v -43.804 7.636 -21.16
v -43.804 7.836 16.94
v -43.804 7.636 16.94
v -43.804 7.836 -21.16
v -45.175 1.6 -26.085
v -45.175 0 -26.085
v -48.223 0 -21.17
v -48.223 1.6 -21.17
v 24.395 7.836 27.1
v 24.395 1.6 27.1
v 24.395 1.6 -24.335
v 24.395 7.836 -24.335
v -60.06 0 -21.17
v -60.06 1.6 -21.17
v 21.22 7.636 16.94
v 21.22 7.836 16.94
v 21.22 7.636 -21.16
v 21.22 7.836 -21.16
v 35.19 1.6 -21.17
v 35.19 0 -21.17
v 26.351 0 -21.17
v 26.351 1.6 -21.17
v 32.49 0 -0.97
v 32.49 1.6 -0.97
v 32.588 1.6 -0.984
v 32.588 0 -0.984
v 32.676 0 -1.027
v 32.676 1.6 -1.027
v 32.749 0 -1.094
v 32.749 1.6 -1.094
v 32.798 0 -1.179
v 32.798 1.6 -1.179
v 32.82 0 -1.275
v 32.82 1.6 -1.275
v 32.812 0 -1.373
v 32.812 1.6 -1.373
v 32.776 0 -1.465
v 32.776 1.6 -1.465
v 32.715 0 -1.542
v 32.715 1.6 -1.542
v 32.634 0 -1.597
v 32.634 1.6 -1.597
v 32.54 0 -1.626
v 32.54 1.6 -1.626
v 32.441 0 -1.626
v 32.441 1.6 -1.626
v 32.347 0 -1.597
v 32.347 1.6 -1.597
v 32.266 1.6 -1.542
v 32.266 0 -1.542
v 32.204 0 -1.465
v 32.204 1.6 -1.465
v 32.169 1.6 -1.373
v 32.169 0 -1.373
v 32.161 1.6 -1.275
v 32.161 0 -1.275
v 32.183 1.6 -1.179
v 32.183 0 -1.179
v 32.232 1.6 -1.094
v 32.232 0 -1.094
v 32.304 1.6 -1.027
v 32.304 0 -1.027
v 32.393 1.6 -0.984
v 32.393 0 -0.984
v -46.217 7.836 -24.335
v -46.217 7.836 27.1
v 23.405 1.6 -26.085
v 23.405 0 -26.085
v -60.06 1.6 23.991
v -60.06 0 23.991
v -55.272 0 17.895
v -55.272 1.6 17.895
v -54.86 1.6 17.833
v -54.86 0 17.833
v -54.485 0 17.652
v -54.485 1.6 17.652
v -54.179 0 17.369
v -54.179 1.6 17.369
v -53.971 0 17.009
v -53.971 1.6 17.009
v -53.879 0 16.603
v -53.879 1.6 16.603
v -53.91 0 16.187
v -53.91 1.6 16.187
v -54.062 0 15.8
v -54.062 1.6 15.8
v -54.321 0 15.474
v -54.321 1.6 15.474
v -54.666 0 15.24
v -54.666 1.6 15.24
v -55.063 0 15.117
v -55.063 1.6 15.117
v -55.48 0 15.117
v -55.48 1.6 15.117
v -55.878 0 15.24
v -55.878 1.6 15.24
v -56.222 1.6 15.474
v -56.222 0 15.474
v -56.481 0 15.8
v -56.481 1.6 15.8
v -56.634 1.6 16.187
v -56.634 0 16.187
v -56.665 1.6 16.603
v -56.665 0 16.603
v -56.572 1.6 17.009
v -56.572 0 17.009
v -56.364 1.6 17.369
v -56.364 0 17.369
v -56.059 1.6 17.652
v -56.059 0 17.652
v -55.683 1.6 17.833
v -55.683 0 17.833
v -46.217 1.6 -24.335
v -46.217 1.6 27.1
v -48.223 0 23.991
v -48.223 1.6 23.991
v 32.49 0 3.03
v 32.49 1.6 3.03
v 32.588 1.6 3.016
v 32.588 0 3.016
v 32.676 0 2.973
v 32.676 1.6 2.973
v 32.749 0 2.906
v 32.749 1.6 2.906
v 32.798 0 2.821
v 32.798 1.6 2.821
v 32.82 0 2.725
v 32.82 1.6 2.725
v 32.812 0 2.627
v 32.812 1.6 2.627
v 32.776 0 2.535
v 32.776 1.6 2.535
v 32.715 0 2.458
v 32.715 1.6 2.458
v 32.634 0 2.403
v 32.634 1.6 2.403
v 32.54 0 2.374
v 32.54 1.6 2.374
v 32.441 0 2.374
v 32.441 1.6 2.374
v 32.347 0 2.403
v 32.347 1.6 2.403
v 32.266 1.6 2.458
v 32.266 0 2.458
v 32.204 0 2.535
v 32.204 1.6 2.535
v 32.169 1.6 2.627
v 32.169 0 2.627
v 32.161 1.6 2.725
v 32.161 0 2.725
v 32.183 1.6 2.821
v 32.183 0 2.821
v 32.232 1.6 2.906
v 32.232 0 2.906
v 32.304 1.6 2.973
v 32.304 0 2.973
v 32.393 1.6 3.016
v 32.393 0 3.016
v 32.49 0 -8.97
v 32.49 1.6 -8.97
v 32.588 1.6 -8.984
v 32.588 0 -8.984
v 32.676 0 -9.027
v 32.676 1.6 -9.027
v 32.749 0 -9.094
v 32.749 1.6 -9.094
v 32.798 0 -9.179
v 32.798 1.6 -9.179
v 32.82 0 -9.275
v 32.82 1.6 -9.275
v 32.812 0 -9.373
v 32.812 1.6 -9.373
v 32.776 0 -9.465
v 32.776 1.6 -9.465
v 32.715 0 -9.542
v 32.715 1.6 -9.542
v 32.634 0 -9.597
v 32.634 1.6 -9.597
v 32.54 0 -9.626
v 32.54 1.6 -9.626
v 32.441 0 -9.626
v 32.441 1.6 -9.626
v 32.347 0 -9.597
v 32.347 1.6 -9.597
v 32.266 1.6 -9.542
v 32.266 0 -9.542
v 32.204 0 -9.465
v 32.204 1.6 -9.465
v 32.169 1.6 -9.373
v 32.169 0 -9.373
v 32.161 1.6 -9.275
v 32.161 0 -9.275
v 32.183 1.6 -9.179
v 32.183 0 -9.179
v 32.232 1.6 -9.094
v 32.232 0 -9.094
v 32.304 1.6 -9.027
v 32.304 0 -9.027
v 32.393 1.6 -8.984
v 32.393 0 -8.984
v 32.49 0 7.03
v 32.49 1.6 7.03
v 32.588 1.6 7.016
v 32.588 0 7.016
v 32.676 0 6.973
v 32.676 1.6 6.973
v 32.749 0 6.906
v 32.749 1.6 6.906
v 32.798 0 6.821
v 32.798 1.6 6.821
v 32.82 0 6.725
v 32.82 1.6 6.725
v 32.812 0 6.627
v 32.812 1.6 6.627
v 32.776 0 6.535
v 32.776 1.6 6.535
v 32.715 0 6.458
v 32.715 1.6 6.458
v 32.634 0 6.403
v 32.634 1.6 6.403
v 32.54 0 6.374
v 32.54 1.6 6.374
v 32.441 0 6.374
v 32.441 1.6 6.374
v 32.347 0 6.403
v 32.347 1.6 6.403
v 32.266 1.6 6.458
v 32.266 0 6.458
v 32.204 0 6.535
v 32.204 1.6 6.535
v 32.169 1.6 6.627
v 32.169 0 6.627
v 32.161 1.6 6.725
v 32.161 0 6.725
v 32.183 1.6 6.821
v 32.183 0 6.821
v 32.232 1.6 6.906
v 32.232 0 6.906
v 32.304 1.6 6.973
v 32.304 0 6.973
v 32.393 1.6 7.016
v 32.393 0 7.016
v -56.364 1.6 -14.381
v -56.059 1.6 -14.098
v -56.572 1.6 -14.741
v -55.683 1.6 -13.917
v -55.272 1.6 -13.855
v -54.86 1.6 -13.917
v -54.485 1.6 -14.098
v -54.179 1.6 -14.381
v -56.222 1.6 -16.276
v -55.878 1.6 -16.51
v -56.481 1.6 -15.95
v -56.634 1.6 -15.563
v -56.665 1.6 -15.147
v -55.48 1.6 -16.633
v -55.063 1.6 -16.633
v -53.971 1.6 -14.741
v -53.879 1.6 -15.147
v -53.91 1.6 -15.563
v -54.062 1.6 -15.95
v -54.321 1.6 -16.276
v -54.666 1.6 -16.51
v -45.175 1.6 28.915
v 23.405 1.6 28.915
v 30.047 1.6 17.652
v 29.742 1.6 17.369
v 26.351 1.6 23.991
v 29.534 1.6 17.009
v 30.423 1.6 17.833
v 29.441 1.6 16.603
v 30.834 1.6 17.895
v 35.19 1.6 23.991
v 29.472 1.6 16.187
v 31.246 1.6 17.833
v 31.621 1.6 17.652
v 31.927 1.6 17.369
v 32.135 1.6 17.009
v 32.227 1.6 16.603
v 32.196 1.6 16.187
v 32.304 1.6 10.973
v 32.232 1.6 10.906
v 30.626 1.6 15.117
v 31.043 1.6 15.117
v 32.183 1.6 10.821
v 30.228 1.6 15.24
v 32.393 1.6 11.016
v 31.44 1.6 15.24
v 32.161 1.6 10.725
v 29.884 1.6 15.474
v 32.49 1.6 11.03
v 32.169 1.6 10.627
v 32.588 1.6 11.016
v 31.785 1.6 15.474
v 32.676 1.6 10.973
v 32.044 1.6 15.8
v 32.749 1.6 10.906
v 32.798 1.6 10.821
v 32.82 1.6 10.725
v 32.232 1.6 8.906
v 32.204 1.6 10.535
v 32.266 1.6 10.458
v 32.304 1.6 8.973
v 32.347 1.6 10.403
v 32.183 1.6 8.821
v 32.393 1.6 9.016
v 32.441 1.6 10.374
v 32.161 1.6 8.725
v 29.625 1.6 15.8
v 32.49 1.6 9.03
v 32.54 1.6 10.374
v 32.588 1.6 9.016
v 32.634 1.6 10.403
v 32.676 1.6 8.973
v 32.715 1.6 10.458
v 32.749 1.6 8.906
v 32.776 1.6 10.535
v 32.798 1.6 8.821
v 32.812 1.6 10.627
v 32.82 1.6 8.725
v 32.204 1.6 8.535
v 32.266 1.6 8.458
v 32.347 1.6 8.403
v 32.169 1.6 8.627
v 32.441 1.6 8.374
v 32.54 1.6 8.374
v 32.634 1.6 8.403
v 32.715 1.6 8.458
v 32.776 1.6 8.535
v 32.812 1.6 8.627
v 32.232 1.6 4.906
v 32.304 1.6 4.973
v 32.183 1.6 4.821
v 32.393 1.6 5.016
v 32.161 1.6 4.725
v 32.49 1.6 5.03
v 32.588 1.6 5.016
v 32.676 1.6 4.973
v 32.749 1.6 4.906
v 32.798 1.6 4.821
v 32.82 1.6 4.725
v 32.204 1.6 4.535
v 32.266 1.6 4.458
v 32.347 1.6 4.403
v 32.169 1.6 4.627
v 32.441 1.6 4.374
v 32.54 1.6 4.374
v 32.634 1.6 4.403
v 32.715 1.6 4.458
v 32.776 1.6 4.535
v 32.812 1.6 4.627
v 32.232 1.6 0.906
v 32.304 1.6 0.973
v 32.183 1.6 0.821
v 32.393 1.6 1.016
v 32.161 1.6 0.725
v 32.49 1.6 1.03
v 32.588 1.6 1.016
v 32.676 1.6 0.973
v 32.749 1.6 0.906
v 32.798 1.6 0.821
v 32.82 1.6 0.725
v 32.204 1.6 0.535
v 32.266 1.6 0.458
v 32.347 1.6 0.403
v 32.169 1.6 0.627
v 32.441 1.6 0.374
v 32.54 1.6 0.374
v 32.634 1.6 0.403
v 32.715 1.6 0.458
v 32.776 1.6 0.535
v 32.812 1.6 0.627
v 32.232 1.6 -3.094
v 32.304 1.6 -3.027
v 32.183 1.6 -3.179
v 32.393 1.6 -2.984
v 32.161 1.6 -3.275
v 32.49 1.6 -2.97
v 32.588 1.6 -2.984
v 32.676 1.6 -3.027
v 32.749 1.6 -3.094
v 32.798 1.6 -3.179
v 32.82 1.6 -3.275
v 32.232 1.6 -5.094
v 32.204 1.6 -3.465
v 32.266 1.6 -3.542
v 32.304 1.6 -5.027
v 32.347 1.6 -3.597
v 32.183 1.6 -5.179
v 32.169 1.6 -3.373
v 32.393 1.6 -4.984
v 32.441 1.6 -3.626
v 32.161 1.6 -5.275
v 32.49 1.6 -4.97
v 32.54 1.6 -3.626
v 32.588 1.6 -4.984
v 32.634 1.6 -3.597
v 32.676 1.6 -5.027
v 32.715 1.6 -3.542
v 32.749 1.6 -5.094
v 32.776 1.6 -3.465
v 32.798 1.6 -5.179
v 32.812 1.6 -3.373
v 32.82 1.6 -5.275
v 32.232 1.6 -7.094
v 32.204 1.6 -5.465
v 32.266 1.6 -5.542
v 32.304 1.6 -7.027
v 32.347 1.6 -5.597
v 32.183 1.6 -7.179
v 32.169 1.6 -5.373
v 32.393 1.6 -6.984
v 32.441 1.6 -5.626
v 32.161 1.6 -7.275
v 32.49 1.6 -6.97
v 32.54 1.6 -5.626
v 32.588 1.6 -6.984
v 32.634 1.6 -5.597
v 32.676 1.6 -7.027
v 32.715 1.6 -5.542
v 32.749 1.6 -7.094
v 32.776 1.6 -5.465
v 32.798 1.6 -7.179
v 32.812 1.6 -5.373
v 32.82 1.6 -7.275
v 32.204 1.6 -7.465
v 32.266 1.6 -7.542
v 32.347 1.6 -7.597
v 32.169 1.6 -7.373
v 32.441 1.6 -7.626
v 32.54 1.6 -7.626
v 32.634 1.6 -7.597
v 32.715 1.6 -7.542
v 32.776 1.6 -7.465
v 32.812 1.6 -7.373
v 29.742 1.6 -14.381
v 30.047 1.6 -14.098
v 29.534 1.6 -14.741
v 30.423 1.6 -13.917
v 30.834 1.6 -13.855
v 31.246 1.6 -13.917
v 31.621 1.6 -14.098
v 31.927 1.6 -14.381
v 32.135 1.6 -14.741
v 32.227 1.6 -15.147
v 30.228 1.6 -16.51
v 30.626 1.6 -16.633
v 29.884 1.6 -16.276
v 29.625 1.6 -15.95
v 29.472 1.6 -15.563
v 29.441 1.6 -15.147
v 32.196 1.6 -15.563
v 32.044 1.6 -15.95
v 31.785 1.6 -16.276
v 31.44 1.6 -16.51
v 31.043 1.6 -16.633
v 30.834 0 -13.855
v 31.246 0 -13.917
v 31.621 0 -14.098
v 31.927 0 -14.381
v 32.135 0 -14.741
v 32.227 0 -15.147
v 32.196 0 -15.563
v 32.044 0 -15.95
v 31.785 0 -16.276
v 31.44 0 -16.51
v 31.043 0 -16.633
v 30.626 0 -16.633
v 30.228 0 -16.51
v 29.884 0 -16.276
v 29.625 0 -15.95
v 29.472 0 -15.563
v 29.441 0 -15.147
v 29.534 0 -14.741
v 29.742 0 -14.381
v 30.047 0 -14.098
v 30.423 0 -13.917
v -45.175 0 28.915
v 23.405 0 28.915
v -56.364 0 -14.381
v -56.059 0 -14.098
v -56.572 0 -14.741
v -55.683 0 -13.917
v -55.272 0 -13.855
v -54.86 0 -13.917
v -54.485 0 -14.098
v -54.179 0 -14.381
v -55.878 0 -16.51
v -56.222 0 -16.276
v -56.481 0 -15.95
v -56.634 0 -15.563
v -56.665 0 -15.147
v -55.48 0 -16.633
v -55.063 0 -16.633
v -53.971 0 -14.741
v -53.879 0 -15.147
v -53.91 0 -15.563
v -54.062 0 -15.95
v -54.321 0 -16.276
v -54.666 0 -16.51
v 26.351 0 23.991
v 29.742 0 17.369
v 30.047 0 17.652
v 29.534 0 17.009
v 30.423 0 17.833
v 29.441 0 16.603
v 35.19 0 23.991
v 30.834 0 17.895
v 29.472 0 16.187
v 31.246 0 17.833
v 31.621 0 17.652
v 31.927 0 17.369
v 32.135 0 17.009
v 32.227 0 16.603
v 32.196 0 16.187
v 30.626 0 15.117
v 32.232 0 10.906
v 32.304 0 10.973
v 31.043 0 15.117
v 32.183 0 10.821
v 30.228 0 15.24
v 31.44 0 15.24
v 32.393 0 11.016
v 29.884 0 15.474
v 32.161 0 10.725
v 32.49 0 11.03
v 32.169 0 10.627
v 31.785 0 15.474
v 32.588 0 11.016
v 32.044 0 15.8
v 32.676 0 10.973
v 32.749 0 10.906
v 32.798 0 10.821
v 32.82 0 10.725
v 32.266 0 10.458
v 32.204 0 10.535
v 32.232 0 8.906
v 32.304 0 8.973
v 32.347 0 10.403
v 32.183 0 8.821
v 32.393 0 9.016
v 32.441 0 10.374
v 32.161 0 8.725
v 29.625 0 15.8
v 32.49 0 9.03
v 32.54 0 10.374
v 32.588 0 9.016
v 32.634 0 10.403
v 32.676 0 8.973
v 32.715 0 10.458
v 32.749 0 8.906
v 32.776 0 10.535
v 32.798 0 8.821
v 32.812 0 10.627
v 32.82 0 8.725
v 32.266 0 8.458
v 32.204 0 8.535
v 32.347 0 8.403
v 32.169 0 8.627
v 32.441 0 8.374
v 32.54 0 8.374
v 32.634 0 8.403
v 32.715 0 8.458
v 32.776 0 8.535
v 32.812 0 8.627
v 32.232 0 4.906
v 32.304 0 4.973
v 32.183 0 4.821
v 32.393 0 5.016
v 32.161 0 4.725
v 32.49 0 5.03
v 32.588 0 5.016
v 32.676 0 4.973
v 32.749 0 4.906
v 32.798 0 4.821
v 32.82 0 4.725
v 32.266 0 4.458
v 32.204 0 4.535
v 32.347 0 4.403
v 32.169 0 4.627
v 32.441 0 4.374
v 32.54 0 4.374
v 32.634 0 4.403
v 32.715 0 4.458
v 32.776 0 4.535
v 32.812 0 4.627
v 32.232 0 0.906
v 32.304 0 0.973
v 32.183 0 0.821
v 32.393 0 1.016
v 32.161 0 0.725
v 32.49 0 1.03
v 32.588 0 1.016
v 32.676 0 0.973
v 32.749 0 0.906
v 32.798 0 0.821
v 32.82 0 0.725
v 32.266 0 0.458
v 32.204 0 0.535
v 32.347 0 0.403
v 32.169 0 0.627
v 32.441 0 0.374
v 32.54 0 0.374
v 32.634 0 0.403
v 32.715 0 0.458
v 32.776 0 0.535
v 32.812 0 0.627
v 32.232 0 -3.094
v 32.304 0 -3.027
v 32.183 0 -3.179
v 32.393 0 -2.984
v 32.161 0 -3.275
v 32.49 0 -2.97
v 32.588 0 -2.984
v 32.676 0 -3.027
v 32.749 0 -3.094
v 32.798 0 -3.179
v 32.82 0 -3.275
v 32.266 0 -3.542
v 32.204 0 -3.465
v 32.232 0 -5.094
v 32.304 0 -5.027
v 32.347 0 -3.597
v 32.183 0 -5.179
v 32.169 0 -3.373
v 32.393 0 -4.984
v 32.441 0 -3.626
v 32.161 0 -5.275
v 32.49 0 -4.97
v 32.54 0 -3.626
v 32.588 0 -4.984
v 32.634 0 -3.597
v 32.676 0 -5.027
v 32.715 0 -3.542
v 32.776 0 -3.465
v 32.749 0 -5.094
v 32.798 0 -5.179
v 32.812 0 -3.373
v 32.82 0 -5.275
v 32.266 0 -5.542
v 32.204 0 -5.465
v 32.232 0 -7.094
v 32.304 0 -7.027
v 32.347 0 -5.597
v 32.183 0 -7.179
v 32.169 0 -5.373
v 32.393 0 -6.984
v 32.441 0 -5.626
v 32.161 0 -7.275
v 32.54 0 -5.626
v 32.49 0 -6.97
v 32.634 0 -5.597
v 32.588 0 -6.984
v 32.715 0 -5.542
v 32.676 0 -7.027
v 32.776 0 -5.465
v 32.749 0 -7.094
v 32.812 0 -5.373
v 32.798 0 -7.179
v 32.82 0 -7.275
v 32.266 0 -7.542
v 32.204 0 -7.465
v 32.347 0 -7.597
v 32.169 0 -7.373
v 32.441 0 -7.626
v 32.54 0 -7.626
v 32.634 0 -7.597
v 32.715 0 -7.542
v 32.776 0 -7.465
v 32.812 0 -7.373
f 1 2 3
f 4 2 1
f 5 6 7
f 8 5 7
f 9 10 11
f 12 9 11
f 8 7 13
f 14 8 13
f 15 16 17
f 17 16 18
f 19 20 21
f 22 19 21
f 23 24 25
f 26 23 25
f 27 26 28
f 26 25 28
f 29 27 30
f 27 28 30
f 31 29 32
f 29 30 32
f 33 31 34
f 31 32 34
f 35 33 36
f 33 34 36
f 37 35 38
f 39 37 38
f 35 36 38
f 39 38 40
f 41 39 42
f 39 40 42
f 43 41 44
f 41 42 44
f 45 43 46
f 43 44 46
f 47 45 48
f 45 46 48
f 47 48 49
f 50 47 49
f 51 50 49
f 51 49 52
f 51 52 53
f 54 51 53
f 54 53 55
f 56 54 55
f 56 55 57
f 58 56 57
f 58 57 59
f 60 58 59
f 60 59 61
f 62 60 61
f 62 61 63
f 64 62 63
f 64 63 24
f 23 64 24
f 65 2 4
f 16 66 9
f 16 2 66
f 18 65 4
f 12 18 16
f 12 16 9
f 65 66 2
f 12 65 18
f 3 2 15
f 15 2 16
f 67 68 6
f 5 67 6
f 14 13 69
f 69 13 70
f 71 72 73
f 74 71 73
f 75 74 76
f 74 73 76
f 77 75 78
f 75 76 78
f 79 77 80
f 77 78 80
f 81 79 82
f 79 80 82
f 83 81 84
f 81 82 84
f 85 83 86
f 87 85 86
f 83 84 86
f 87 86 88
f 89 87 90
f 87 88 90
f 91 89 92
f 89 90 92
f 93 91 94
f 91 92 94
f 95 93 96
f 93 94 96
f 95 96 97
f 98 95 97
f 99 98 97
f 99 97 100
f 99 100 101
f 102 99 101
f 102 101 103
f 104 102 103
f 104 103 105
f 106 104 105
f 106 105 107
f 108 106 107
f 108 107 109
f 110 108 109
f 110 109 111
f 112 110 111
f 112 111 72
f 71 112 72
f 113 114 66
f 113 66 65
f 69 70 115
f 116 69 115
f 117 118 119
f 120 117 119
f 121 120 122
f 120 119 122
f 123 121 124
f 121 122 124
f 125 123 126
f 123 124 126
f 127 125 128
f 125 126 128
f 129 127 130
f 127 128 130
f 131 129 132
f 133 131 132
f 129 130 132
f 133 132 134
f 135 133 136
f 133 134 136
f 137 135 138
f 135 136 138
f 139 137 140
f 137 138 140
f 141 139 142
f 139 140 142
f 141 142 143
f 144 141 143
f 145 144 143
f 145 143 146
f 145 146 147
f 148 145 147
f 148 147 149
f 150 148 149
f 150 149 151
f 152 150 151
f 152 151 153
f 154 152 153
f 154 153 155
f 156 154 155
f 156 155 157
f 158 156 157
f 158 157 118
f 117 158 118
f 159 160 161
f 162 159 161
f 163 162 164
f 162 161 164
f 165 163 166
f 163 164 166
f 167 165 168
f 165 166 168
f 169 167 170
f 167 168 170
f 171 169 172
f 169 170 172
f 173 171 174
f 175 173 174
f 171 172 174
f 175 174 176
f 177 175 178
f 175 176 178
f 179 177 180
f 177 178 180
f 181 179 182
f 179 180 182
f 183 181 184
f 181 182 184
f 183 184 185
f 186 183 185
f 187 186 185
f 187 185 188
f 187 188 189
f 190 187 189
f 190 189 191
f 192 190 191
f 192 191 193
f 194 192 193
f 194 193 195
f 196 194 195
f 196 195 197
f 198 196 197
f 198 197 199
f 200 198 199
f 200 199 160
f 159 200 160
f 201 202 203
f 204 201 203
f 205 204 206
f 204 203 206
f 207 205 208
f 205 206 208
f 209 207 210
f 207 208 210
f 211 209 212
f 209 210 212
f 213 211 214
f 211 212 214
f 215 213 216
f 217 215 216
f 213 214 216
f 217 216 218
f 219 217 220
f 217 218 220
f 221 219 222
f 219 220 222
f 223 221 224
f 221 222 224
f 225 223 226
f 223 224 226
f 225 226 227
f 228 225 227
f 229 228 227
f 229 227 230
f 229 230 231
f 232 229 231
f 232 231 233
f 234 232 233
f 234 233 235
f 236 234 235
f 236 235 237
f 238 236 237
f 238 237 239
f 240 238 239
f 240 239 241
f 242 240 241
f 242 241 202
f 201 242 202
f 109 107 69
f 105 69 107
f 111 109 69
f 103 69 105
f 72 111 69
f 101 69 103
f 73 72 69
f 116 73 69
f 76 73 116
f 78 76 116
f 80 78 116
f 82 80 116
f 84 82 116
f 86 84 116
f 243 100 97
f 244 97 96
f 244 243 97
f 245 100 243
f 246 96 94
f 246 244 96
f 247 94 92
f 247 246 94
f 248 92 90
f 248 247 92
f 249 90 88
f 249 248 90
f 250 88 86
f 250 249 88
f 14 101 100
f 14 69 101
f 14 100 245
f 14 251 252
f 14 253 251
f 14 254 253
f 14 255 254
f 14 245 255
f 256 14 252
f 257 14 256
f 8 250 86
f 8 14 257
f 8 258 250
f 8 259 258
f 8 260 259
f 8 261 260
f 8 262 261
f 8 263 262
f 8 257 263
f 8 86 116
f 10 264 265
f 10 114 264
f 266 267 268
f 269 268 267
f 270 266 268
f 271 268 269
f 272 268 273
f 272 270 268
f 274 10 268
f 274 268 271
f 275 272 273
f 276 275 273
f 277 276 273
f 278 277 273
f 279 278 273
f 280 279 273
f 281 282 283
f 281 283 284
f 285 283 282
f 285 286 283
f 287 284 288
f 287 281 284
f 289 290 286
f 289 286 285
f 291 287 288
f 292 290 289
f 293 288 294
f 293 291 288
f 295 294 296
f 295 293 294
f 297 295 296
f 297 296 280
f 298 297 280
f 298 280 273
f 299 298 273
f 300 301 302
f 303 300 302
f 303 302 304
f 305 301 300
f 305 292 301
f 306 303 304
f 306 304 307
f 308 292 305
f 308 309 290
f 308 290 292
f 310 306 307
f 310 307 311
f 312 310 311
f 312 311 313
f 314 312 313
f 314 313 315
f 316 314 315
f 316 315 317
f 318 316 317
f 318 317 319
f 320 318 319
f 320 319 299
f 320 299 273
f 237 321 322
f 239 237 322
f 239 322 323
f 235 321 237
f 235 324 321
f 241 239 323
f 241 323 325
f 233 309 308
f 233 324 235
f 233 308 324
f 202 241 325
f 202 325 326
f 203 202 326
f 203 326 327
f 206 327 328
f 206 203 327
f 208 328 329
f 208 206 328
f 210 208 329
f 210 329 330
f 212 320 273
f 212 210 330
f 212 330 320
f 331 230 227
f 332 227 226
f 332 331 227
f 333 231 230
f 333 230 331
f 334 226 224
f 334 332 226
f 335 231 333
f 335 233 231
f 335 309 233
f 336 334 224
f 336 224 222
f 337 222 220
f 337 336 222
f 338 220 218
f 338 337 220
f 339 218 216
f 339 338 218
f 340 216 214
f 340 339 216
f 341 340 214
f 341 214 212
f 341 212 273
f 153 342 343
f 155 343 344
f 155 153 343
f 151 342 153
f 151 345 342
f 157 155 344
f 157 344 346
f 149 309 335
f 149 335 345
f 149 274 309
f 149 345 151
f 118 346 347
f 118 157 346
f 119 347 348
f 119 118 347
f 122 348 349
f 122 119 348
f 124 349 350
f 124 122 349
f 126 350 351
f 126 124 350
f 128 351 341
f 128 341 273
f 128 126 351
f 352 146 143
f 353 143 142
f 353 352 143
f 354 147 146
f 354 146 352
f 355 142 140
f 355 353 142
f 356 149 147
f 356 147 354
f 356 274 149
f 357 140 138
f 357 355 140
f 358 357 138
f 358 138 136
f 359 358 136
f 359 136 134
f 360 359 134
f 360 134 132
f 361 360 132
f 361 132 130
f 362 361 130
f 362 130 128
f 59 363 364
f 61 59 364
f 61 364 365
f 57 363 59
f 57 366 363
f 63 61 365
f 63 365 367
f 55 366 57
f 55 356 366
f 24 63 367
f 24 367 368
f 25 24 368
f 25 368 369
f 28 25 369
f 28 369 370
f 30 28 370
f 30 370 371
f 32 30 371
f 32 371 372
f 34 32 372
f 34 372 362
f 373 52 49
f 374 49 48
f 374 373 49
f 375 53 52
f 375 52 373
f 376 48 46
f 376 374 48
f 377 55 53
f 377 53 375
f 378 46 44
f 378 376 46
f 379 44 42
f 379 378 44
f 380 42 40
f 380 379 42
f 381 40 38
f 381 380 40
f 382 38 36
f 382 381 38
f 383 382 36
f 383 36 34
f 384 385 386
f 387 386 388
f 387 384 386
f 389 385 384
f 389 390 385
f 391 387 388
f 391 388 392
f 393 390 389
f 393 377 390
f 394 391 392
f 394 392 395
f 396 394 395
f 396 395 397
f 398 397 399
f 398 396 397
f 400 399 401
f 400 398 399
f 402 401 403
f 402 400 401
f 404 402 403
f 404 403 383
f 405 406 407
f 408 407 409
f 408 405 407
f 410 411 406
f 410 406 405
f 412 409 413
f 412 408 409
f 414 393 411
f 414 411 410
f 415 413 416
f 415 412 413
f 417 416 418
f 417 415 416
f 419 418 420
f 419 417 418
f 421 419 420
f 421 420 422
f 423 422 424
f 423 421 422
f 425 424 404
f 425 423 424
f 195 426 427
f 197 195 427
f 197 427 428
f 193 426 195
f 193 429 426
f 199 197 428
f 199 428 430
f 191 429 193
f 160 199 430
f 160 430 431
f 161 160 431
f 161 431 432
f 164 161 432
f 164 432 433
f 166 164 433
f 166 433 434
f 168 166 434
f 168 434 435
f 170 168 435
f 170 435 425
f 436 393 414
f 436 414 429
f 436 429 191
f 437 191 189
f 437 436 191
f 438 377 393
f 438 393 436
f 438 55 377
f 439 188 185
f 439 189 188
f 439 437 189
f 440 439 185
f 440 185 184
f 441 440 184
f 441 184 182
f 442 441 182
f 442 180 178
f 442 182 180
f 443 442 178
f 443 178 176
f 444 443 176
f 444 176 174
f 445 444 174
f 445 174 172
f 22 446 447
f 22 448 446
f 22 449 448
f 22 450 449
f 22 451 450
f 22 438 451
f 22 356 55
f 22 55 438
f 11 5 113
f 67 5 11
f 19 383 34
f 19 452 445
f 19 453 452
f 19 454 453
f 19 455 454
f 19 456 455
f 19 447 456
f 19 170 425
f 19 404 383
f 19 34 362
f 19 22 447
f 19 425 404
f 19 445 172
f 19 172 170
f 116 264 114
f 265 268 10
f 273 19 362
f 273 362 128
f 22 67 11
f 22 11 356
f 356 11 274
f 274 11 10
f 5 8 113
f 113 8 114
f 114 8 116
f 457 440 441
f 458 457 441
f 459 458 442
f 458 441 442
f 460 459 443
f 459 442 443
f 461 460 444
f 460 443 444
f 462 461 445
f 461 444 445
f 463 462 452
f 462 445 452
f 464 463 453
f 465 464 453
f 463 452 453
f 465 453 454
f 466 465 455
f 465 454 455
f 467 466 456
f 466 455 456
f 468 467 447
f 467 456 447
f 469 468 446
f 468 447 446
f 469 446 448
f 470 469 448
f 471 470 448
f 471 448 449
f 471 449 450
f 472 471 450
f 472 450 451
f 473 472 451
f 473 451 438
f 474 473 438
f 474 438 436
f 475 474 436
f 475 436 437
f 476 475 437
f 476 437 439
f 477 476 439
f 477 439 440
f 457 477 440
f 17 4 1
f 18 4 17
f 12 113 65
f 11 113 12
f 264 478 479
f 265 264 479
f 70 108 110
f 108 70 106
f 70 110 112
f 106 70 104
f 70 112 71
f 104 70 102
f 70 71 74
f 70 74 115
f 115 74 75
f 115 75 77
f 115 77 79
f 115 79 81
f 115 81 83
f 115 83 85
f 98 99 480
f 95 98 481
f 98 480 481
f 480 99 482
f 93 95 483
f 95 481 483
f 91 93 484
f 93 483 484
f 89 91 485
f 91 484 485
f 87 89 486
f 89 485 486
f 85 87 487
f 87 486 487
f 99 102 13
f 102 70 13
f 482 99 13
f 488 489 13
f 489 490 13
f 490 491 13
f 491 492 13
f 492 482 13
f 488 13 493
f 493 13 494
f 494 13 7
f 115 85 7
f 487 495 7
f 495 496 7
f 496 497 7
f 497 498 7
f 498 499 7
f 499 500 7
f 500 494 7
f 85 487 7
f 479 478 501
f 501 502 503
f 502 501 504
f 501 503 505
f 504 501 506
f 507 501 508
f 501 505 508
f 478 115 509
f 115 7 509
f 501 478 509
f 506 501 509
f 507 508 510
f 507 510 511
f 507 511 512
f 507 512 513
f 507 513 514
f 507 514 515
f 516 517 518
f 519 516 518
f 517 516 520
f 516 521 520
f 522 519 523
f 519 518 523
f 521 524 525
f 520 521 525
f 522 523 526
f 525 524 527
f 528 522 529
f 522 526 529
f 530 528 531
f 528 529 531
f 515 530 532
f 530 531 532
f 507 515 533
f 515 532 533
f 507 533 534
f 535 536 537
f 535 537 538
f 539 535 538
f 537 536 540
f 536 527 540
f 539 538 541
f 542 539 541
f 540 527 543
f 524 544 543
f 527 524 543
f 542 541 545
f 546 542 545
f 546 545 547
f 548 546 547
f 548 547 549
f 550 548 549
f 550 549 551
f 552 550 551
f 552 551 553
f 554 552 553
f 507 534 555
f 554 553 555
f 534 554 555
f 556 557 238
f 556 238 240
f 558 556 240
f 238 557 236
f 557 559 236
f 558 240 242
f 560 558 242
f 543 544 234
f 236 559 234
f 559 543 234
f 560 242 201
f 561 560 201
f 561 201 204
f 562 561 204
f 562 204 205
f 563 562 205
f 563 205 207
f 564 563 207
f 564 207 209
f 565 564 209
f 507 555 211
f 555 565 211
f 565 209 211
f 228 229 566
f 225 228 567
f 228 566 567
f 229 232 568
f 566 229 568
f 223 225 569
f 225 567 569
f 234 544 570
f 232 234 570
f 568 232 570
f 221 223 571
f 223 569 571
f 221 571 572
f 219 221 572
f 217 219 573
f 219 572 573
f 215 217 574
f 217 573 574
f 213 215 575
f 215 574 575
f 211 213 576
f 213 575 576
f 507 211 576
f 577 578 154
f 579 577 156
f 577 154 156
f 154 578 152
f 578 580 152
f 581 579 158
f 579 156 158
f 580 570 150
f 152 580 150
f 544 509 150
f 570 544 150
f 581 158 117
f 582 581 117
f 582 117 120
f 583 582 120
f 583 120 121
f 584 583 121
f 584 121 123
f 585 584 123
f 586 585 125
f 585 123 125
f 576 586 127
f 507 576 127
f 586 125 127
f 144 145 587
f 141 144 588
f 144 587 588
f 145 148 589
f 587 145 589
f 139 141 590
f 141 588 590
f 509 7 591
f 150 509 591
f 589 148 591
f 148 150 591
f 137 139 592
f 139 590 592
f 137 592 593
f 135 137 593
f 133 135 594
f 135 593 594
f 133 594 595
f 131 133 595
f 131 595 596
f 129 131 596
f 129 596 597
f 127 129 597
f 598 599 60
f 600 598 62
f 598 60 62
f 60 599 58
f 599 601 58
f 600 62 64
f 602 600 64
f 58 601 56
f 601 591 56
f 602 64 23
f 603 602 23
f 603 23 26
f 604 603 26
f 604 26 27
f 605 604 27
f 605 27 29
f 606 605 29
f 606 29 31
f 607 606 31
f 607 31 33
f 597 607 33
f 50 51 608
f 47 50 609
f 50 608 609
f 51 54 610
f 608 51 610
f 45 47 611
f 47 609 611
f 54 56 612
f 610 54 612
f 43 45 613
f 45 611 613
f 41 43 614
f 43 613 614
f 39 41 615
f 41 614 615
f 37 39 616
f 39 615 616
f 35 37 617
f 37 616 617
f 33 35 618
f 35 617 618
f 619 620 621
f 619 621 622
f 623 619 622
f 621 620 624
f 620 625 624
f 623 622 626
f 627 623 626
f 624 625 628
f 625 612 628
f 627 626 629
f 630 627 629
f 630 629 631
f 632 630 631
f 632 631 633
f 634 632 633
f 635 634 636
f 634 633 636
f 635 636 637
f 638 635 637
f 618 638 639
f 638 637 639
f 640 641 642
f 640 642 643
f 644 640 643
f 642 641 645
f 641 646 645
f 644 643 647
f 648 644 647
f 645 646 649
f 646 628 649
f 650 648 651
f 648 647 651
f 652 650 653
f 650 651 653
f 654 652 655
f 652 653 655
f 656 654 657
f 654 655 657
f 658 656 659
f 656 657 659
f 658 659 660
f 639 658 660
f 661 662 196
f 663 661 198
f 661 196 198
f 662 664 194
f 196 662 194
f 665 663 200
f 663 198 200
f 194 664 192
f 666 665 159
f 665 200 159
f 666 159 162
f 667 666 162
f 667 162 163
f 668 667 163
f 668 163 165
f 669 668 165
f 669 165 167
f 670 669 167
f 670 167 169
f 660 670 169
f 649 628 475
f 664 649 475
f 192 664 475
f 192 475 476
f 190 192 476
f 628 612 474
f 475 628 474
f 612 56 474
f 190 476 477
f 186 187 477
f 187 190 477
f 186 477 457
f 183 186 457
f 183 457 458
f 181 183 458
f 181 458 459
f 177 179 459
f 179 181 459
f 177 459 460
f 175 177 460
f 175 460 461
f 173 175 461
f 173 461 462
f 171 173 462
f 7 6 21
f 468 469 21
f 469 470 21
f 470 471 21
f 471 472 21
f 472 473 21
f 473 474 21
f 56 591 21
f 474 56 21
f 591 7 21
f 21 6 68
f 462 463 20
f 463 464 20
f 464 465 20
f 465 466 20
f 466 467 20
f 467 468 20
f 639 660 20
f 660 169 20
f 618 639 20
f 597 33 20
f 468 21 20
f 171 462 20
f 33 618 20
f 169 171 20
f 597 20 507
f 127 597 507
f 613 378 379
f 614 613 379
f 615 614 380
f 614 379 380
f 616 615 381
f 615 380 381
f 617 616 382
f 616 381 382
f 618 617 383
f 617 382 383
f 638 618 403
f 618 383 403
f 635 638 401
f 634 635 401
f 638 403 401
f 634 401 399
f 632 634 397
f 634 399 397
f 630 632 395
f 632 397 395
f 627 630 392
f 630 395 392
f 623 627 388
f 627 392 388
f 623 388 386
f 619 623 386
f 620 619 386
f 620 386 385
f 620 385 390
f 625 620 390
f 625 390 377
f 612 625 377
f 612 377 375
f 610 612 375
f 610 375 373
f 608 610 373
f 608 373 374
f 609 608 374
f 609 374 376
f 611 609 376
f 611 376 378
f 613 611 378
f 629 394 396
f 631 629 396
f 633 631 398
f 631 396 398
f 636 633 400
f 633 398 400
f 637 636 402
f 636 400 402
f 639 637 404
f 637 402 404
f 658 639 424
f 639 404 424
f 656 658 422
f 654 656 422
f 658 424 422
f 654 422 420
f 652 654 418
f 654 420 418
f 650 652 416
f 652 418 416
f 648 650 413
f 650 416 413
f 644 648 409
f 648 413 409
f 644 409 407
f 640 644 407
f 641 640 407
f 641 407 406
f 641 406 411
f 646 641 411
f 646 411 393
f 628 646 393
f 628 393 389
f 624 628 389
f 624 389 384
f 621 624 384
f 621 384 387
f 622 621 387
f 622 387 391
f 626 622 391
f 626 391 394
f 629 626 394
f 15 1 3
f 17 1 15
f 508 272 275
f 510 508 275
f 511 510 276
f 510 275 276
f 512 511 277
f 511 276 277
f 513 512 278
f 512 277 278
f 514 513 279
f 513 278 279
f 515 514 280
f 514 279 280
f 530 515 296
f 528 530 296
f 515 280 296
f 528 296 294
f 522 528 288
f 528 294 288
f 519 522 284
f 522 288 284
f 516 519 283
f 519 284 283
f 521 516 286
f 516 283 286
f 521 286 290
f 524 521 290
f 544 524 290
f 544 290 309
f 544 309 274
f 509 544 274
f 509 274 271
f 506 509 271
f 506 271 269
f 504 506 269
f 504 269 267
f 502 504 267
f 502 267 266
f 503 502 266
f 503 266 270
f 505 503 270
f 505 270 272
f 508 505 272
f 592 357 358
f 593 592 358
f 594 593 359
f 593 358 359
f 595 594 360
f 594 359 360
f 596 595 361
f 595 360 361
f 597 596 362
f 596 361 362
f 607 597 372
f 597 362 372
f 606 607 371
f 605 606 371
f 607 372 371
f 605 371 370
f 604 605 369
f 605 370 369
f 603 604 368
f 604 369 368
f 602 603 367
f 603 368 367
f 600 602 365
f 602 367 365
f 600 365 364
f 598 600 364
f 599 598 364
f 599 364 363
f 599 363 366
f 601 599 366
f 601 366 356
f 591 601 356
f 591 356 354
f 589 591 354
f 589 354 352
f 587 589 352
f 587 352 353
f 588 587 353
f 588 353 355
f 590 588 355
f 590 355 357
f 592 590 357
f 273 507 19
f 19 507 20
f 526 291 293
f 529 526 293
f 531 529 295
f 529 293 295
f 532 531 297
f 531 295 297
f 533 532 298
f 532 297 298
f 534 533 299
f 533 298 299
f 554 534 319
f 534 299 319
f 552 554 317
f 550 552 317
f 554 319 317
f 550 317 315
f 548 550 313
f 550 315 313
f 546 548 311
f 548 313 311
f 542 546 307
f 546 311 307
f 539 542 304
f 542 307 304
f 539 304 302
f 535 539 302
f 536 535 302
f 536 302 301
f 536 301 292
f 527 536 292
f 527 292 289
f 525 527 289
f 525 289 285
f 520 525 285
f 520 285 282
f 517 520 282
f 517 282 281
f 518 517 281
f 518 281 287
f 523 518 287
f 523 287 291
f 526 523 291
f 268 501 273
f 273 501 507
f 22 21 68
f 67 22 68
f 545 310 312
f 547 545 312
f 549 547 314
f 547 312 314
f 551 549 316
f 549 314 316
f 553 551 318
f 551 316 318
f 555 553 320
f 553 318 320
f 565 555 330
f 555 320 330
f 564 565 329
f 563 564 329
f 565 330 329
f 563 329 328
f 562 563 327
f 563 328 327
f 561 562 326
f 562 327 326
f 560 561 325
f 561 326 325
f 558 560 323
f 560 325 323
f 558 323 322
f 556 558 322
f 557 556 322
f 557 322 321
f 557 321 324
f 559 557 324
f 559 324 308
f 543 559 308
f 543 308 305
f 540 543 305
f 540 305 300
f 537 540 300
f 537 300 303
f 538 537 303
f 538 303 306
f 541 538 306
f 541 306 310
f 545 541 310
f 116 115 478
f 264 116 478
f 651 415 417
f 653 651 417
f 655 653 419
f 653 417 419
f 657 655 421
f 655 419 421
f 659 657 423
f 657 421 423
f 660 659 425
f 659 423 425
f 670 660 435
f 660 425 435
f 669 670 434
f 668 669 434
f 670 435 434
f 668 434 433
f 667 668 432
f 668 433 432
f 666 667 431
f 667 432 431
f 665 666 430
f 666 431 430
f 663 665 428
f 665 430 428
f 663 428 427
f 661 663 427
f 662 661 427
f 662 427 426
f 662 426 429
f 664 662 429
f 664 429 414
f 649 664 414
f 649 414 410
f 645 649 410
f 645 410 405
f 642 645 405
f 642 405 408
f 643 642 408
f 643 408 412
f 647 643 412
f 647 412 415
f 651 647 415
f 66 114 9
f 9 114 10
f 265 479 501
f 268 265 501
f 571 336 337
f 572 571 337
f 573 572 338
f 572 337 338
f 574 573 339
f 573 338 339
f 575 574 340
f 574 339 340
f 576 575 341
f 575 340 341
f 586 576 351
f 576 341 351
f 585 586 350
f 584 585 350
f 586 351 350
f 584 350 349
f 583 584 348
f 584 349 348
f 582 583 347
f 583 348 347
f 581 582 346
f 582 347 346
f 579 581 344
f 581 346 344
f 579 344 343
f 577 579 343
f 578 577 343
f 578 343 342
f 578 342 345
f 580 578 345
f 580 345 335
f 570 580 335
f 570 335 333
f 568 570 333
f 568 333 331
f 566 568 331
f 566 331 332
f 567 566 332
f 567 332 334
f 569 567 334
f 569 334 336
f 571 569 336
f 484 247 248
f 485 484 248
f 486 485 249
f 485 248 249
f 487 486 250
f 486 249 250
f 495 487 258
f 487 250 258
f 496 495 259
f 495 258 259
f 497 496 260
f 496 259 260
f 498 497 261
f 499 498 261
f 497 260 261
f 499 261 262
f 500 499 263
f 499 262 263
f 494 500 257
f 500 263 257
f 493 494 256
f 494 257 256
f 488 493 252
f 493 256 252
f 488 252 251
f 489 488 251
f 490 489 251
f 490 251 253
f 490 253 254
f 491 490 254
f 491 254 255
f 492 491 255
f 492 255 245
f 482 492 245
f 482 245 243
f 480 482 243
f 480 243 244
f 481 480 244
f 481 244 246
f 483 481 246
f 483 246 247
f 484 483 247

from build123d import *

# Parameters (mm, degrees)
BOSS_EXTRUDE1_DEPTH = 1.6
SKETCH2_R           = 1.397
CUT_EXTRUDE1_DEPTH  = 67.676798076
SKETCH3_W           = 70.612
SKETCH3_H           = 51.435
BOSS_EXTRUDE2_DEPTH = 6.2357
SKETCH4_W           = 65.024
SKETCH4_H           = 38.1
CUT_EXTRUDE2_DEPTH  = 0.2
SKETCH5_R           = 0.3302
CUT_EXTRUDE3_DEPTH  = 67.94863222
LPATTERN1_COUNT     = 11
LPATTERN1_PITCH     = 2


with BuildPart() as part:
    # Sketch1 → Boss-Extrude1 (new body)
    with BuildSketch(Plane(origin=(0, 0, 0), x_dir=(1, 0, 0), z_dir=(0, 1, 0))):
        Polygon((-60.059561589, 21.169974834), (-60.059561589, -23.991225166), (-48.223161589, -23.991225166), (-45.175161589, -28.915125166), (23.404838411, -28.915125166), (26.351238411, -23.991225166), (35.190438411, -23.991225166), (35.190438411, 21.169974834), (26.351238411, 21.169974834), (23.404838411, 26.084874834), (-45.175161589, 26.084874834), (-48.223161589, 21.169974834), align=None)
    extrude(amount=BOSS_EXTRUDE1_DEPTH)

    # Sketch2 → Cut-Extrude1 (cut, through all)
    with BuildSketch(Plane(origin=(0, 1.6, 0), x_dir=(1, 0, 0), z_dir=(0, 1, 0))):
        with Locations(Location((-55.271661589, 15.251774834, 0), (0, 0, 270))):
            Circle(SKETCH2_R)
        with Locations(Location((-55.271661589, -16.498225166, 0), (0, 0, 270))):
            Circle(SKETCH2_R)
        with Locations(Location((30.834338411, -16.498225166, 0), (0, 0, 270))):
            Circle(SKETCH2_R)
        with Locations(Location((30.834338411, 15.251774834, 0), (0, 0, 270))):
            Circle(SKETCH2_R)
    extrude(amount=-CUT_EXTRUDE1_DEPTH, mode=Mode.SUBTRACT)

    # Sketch3 → Boss-Extrude2 (add)
    with BuildSketch(Plane(origin=(0, 1.6, 0), x_dir=(1, 0, 0), z_dir=(0, 1, 0))):
        with Locations((-10.910561589, -1.382625166)):
            Rectangle(SKETCH3_W, SKETCH3_H)
    extrude(amount=BOSS_EXTRUDE2_DEPTH)

    # Sketch4 → Cut-Extrude2 (cut)
    with BuildSketch(Plane(origin=(0, 7.8357, 0), x_dir=(1, 0, 0), z_dir=(0, 1, 0))):
        with Locations((-11.291561589, 2.109874834)):
            Rectangle(SKETCH4_W, SKETCH4_H)
    extrude(amount=-CUT_EXTRUDE2_DEPTH, mode=Mode.SUBTRACT)

    # Sketch5 → Cut-Extrude3 (cut, through all)
    with BuildSketch(Plane(origin=(0, 1.6, 0), x_dir=(1, 0, 0), z_dir=(0, 1, 0))):
        with Locations(Location((32.490438411, 9.299974834, 0), (0, 0, 270))):
            Circle(SKETCH5_R)
    cut_extrude3 = extrude(amount=-CUT_EXTRUDE3_DEPTH, mode=Mode.SUBTRACT)

    # LPattern1: Cut-Extrude3 ×11
    with Locations(*[(0, 0, i * LPATTERN1_PITCH) for i in range(1, LPATTERN1_COUNT)]):
        add(cut_extrude3, mode=Mode.SUBTRACT)


solid = part.part
